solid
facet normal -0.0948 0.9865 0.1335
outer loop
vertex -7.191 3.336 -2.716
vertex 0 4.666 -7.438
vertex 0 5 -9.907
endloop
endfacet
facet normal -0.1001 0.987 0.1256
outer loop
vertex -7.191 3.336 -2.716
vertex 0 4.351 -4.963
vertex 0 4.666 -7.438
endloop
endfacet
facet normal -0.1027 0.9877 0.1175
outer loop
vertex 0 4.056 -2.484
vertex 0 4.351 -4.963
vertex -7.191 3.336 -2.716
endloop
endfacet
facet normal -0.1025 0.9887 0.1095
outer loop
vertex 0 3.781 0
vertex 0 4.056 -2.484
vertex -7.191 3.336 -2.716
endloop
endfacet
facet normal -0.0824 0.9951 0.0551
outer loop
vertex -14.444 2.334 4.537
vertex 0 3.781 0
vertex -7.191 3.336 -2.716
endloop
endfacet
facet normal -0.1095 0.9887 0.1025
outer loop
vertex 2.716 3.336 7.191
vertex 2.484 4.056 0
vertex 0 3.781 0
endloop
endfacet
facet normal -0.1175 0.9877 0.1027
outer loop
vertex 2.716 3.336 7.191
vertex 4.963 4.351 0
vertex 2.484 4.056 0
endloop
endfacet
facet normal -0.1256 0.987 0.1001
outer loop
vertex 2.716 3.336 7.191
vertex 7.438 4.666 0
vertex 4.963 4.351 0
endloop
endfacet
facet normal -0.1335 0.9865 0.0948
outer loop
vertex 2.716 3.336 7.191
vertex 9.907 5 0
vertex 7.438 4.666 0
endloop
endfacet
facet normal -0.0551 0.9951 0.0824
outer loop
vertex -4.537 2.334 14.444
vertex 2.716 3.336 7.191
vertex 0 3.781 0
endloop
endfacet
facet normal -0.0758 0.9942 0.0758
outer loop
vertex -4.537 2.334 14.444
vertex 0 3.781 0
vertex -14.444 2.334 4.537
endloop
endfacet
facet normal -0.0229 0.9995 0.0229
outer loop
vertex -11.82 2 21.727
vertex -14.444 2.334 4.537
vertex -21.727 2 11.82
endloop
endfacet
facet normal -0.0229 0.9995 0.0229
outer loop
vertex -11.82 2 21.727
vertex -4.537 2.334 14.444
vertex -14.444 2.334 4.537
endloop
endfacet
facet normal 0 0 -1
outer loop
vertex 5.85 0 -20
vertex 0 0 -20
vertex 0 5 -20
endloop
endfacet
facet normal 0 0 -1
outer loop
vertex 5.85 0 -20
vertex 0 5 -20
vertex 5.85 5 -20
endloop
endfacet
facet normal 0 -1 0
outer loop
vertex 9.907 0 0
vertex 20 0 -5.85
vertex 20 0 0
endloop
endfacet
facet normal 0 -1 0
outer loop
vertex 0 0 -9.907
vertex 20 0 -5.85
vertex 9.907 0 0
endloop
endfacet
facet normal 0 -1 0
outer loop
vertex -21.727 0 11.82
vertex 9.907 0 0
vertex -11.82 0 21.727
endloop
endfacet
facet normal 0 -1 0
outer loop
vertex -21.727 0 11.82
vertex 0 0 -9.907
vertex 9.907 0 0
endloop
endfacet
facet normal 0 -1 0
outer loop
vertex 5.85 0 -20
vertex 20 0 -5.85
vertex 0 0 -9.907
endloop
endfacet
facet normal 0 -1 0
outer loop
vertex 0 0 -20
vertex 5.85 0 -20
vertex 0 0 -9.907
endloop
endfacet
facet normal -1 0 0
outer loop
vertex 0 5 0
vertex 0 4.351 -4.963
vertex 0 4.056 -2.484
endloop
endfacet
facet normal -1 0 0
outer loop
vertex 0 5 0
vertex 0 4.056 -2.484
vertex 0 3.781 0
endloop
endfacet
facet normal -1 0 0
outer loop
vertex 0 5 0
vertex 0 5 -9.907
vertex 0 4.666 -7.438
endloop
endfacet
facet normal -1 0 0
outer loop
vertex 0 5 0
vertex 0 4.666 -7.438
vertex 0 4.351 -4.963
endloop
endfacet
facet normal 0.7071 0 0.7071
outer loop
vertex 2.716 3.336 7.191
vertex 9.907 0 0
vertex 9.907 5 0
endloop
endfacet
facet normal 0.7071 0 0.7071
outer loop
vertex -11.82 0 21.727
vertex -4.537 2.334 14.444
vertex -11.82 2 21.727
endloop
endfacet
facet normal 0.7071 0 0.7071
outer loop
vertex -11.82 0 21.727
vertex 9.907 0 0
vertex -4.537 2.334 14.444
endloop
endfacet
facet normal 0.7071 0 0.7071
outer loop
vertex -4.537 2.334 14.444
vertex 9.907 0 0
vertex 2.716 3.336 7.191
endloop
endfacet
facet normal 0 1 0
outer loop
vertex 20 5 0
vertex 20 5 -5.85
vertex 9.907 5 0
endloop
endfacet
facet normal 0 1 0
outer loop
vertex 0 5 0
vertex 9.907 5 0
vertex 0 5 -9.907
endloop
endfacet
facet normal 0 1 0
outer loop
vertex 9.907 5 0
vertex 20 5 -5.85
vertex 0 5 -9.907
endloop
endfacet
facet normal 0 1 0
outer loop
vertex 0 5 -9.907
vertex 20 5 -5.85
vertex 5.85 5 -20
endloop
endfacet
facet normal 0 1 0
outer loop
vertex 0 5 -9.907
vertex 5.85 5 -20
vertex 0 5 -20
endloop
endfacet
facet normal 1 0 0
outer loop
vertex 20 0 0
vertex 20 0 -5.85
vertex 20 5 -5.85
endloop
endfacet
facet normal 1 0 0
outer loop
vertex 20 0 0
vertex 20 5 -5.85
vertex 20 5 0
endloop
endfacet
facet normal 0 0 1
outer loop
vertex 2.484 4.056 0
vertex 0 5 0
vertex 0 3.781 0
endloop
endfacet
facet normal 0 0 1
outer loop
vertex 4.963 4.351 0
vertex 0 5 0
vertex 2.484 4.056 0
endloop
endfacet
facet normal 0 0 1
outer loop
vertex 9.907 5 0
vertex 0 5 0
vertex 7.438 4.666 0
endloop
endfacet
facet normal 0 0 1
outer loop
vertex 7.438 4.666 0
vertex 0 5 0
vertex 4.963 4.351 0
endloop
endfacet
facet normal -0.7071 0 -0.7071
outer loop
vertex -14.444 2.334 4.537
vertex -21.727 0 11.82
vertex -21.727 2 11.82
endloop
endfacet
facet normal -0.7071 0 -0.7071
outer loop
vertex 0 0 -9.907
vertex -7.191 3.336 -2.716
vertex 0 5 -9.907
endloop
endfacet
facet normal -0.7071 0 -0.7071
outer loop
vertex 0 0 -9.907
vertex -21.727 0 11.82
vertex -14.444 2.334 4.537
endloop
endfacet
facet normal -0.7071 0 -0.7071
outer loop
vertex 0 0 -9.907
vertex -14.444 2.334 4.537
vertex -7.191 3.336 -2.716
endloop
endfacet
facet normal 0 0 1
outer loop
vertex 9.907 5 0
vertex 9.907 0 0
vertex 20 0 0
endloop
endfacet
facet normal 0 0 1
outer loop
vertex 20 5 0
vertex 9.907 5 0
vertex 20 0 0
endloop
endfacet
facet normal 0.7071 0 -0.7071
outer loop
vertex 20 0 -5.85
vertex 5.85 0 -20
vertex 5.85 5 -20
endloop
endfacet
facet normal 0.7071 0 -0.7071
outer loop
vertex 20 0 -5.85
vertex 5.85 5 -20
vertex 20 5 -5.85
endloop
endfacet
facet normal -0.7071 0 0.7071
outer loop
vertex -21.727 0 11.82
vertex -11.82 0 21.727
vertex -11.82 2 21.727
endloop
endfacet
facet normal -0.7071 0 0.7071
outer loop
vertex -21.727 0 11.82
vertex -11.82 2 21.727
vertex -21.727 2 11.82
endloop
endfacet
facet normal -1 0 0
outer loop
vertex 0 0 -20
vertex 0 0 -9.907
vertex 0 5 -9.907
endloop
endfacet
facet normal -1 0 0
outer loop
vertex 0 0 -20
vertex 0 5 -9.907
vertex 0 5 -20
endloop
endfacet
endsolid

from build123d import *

# Parameters (mm, degrees)
EXTRUDE_1_DEPTH     = 5
CUT_EXTRUDE_1_DEPTH = 20
EXTRUDE_2_DEPTH     = 5


with BuildPart() as part:
    # 草图1 → 凸台-拉伸1 (new body)
    with BuildSketch(Plane(origin=(0, 0, 0), x_dir=(1, 0, 0), z_dir=(0, 1, 0))):
        Polygon((0, 20), (5.85, 20), (20, 5.85), (20, 0), (14.15, 0), (9.907359313, 0), (-11.819805153, -21.727164466), (-21.727164466, -11.819805153), (0, 9.907359313), align=None)
    extrude(amount=EXTRUDE_1_DEPTH)

    # 草图2 → 切除-拉伸1 (cut)
    with BuildSketch(Plane(origin=(4.953679656, 0, 4.953679656), x_dir=(0.7071067811865477, 0, -0.7071067811865475), z_dir=(0.7071067811865475, 0, 0.7071067811865477))):
        with BuildLine():
            Line((-23.721289706, 2), (-23.721289706, 5))
            Line((-23.721289706, 5), (7.005560954, 5))
            ThreePointArc((7.005560954, 5), (-8.284812198, 2.751778874), (-23.721289706, 2))
        make_face()
    extrude(amount=-CUT_EXTRUDE_1_DEPTH, mode=Mode.SUBTRACT)

    # 草图3 → 凸台-拉伸2 (add)
    with BuildSketch(Plane(origin=(0, 5, 0), x_dir=(1, 0, 0), z_dir=(0, 1, 0))):
        Polygon((0, 9.907359313), (0, 0), (9.907359313, 0), align=None)
    extrude(amount=-EXTRUDE_2_DEPTH)


solid = part.part
